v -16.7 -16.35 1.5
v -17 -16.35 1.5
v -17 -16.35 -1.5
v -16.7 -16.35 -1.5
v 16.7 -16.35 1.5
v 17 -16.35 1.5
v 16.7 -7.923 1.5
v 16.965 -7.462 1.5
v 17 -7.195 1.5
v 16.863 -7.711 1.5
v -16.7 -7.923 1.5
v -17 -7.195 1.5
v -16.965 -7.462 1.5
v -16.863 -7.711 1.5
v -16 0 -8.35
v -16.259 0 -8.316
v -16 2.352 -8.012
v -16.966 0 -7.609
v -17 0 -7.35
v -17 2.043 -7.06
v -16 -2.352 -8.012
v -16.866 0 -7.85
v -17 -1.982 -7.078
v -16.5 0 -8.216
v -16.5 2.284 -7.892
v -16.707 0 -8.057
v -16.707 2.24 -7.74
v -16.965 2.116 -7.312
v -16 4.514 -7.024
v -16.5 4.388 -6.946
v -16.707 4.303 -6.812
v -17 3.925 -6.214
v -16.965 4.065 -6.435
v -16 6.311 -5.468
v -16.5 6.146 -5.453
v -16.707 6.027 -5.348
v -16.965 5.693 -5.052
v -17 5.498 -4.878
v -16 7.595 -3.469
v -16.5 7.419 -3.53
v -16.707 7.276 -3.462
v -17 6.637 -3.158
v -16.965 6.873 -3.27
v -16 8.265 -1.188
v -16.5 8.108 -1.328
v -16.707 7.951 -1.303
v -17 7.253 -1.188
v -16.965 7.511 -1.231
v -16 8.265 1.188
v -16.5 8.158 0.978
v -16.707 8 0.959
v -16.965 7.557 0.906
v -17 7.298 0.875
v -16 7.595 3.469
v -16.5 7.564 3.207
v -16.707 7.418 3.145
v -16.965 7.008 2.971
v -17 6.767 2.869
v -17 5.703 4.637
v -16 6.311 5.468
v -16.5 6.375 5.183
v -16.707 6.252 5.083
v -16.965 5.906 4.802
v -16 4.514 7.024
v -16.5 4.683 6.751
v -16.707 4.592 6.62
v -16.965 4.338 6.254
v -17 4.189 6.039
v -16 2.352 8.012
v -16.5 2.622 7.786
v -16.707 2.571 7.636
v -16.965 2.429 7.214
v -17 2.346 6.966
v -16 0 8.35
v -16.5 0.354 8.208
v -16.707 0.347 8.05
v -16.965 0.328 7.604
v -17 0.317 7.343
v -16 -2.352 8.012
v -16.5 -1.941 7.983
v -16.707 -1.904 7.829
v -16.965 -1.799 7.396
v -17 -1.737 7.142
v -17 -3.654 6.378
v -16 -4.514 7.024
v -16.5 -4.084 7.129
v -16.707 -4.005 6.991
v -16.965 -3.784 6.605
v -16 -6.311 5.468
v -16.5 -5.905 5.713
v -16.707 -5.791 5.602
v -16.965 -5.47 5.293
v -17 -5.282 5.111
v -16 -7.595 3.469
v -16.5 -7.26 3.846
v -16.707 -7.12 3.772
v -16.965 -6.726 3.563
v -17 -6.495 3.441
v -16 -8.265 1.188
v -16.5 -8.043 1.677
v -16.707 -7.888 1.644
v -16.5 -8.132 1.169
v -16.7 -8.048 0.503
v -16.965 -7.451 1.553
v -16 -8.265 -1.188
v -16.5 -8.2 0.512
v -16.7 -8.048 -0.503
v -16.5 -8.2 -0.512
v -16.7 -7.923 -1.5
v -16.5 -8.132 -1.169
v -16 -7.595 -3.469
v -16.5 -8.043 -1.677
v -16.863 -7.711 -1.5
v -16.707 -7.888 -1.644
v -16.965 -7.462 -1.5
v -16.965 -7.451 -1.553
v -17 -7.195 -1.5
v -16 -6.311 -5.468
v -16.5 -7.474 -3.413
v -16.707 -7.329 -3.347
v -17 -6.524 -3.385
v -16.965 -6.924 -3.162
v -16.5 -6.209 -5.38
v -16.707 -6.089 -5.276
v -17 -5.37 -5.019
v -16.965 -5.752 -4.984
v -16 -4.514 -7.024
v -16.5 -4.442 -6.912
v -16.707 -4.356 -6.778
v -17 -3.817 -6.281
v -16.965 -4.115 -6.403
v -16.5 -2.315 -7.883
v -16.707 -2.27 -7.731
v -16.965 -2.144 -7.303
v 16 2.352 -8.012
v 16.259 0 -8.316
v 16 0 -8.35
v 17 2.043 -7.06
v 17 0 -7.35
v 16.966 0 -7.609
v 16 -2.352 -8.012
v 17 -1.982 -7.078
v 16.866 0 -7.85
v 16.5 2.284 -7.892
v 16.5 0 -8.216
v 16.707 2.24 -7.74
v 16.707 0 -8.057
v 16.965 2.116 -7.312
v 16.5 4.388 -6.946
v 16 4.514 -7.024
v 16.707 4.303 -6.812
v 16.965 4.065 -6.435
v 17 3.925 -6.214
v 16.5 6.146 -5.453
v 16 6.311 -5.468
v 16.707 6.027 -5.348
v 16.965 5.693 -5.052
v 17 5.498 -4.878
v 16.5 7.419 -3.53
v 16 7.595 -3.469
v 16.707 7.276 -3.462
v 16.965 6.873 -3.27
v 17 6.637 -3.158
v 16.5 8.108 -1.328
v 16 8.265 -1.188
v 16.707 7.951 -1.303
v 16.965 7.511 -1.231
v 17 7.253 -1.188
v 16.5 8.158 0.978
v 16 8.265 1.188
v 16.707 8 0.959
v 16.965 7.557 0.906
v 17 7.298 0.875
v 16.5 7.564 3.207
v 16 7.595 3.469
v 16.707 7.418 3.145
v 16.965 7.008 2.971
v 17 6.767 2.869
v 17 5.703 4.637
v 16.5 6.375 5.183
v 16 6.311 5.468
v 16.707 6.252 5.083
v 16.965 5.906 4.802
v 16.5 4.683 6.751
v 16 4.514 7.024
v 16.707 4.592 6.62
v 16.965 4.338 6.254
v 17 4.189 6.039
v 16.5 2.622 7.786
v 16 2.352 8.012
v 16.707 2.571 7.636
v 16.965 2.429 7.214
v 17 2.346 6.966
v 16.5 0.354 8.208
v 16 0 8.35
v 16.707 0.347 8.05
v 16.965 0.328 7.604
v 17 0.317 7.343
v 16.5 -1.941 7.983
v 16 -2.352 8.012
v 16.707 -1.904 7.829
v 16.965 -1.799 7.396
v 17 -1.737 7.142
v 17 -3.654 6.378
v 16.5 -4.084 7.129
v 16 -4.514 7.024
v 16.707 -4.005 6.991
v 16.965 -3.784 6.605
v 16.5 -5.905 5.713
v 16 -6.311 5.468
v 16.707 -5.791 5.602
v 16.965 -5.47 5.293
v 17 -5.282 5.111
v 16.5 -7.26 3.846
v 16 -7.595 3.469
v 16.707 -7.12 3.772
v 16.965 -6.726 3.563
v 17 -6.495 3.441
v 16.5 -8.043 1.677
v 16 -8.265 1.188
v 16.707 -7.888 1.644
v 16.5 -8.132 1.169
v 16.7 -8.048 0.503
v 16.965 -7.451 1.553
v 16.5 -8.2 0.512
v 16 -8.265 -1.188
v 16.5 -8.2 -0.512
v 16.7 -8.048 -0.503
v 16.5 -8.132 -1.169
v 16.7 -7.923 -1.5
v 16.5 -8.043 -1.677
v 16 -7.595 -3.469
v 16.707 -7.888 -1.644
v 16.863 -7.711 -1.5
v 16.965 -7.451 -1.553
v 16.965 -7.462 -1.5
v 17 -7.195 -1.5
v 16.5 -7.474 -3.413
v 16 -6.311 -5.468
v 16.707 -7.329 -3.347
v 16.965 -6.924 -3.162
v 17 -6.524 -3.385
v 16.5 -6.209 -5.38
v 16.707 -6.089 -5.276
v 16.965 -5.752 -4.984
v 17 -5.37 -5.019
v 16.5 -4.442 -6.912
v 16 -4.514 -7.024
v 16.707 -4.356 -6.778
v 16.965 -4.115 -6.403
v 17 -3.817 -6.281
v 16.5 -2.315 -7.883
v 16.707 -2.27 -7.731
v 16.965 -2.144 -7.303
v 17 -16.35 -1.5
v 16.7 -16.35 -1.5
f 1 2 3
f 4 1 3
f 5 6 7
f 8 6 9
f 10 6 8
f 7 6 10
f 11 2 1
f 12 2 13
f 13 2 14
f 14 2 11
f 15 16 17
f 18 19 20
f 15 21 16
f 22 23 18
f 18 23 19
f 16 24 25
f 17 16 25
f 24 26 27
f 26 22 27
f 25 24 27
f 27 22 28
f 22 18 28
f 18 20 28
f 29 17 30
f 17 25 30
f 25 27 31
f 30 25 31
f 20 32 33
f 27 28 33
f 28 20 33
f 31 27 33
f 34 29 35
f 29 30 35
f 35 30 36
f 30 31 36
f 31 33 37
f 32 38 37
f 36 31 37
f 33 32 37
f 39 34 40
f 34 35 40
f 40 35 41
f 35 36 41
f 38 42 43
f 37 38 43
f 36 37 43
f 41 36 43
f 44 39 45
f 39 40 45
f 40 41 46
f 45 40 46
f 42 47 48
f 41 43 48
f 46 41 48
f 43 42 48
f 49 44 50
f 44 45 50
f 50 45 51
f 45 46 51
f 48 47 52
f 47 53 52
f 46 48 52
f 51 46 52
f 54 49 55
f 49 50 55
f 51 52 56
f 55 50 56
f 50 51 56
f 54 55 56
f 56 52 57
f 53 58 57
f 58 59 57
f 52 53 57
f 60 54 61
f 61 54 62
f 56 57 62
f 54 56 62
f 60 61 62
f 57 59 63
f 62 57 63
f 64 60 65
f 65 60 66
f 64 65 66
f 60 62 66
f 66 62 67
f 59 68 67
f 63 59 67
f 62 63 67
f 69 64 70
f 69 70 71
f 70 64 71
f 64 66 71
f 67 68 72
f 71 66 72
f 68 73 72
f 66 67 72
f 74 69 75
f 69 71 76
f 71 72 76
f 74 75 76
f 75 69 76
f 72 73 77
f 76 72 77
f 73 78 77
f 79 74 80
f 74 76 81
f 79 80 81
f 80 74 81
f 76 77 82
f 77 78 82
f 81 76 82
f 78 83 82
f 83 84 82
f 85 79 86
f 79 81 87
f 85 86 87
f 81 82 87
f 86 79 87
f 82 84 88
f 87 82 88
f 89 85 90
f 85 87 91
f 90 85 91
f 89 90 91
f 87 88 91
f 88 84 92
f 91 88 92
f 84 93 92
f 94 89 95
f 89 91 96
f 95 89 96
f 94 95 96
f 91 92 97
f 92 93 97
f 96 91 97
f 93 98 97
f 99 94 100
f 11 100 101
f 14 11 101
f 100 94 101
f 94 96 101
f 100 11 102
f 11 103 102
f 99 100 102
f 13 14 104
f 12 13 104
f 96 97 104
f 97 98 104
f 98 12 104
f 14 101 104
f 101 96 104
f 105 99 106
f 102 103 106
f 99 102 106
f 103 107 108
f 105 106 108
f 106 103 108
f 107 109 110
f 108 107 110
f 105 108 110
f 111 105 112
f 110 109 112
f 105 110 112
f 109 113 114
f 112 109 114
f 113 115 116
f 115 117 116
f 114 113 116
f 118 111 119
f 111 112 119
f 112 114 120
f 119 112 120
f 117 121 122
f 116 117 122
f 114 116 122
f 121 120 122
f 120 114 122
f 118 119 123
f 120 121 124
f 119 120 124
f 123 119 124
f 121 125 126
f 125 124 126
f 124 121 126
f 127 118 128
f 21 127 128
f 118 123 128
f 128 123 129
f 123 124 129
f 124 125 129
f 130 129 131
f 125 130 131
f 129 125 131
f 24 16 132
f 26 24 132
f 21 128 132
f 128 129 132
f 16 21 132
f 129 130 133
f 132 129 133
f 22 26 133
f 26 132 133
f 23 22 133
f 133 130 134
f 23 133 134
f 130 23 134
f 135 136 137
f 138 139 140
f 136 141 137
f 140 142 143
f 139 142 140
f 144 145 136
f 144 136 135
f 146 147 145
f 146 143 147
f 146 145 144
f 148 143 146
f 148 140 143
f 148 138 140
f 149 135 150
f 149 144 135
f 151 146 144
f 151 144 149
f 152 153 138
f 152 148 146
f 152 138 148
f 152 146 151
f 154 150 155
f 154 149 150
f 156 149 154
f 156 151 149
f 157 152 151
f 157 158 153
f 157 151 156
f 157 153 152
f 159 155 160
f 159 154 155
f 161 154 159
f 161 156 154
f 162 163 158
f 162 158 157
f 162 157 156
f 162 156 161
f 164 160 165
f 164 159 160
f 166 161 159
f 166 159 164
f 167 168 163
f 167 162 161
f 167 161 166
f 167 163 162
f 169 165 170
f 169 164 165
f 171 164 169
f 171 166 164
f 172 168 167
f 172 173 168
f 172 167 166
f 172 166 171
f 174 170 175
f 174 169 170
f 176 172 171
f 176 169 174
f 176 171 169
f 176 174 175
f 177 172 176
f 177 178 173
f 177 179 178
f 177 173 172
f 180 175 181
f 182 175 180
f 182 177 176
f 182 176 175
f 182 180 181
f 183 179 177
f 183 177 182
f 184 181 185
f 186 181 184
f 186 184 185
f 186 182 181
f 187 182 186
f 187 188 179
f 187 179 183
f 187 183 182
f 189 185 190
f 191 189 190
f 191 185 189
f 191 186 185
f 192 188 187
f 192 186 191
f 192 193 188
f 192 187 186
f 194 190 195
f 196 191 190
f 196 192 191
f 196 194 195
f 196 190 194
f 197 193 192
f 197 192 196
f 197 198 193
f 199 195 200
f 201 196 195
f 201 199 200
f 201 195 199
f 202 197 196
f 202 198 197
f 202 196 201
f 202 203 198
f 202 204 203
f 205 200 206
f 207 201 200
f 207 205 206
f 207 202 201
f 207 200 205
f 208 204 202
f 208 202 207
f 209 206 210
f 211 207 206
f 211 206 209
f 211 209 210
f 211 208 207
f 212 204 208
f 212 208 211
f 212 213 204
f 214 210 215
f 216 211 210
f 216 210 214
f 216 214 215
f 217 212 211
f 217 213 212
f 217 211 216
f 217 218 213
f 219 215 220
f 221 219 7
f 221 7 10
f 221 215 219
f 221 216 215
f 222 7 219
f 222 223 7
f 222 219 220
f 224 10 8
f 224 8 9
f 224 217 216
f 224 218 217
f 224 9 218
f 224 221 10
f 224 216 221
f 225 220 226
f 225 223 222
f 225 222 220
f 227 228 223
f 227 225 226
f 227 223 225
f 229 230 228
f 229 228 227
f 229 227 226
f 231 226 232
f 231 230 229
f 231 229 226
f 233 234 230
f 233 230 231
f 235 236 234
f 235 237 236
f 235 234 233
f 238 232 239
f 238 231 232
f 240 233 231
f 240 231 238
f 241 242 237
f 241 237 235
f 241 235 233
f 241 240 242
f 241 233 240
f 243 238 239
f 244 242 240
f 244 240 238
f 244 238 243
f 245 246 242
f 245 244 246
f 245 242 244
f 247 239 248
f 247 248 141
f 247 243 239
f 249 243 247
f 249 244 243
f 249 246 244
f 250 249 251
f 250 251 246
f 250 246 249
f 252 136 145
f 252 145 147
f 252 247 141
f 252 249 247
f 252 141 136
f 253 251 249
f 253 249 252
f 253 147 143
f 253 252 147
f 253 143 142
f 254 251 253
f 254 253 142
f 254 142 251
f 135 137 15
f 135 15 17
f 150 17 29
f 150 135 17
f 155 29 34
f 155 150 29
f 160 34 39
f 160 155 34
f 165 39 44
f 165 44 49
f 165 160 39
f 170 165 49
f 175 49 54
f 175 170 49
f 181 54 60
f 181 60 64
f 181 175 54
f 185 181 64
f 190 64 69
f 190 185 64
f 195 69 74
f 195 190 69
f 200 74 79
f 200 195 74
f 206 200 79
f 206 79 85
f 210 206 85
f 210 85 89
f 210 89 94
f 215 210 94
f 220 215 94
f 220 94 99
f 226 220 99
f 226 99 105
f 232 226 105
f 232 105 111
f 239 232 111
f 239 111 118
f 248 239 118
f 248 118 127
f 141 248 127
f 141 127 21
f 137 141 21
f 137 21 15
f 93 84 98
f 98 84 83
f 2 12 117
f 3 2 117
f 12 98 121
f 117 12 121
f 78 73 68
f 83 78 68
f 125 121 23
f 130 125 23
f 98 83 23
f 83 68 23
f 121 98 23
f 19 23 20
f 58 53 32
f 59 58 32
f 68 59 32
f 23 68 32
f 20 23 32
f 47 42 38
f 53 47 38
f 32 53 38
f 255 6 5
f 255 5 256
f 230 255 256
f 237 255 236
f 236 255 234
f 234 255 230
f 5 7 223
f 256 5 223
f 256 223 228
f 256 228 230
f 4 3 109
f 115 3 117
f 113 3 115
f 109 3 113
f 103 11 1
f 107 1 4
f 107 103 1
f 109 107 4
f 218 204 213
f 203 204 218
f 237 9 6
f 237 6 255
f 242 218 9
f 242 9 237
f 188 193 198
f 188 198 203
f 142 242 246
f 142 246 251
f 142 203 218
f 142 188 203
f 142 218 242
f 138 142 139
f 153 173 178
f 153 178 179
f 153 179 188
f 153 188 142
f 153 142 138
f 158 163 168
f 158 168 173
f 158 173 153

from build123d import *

# Parameters (mm, degrees)
SKETCH_1_R      = 8.35
EXTRUDE_1_DEPTH = 17
FILLET_1_R      = 1
SKETCH_2_W      = 3
SKETCH_2_H      = 16.35
EXTRUDE_2_DEPTH = 0.3


with BuildPart() as part:
    # Эскиз1 → Бобышка-Вытянуть1 (new, symmetric)
    with BuildSketch(Plane(origin=(0, 0, 0), x_dir=(0, 0, -1), z_dir=(1, 0, 0))):
        Circle(SKETCH_1_R)
    extrude(amount=EXTRUDE_1_DEPTH, both=True)

    # Скругление1
    fillet_1_edges = [part.edges().sort_by_distance(p)[0] for p in [
        (-17, 0, 8.35),
        (17, 0, 8.35),
    ]]
    fillet(fillet_1_edges, radius=FILLET_1_R)

    # Эскиз2 → Бобышка-Вытянуть2 (add)
    with BuildSketch(Plane(origin=(17, 0, 0), x_dir=(0, 0, -1), z_dir=(1, 0, 0))):
        with Locations((0, -8.175)):
            Rectangle(SKETCH_2_W, SKETCH_2_H)
    extrude_2 = extrude(amount=-EXTRUDE_2_DEPTH)

    # Зеркальное отражение1: Бобышка-Вытянуть2 across plane
    add(extrude_2.mirror(Plane(origin=(0, 0, 0), x_dir=(0, 0, 1), z_dir=(1, 0, 0))))


solid = part.part
